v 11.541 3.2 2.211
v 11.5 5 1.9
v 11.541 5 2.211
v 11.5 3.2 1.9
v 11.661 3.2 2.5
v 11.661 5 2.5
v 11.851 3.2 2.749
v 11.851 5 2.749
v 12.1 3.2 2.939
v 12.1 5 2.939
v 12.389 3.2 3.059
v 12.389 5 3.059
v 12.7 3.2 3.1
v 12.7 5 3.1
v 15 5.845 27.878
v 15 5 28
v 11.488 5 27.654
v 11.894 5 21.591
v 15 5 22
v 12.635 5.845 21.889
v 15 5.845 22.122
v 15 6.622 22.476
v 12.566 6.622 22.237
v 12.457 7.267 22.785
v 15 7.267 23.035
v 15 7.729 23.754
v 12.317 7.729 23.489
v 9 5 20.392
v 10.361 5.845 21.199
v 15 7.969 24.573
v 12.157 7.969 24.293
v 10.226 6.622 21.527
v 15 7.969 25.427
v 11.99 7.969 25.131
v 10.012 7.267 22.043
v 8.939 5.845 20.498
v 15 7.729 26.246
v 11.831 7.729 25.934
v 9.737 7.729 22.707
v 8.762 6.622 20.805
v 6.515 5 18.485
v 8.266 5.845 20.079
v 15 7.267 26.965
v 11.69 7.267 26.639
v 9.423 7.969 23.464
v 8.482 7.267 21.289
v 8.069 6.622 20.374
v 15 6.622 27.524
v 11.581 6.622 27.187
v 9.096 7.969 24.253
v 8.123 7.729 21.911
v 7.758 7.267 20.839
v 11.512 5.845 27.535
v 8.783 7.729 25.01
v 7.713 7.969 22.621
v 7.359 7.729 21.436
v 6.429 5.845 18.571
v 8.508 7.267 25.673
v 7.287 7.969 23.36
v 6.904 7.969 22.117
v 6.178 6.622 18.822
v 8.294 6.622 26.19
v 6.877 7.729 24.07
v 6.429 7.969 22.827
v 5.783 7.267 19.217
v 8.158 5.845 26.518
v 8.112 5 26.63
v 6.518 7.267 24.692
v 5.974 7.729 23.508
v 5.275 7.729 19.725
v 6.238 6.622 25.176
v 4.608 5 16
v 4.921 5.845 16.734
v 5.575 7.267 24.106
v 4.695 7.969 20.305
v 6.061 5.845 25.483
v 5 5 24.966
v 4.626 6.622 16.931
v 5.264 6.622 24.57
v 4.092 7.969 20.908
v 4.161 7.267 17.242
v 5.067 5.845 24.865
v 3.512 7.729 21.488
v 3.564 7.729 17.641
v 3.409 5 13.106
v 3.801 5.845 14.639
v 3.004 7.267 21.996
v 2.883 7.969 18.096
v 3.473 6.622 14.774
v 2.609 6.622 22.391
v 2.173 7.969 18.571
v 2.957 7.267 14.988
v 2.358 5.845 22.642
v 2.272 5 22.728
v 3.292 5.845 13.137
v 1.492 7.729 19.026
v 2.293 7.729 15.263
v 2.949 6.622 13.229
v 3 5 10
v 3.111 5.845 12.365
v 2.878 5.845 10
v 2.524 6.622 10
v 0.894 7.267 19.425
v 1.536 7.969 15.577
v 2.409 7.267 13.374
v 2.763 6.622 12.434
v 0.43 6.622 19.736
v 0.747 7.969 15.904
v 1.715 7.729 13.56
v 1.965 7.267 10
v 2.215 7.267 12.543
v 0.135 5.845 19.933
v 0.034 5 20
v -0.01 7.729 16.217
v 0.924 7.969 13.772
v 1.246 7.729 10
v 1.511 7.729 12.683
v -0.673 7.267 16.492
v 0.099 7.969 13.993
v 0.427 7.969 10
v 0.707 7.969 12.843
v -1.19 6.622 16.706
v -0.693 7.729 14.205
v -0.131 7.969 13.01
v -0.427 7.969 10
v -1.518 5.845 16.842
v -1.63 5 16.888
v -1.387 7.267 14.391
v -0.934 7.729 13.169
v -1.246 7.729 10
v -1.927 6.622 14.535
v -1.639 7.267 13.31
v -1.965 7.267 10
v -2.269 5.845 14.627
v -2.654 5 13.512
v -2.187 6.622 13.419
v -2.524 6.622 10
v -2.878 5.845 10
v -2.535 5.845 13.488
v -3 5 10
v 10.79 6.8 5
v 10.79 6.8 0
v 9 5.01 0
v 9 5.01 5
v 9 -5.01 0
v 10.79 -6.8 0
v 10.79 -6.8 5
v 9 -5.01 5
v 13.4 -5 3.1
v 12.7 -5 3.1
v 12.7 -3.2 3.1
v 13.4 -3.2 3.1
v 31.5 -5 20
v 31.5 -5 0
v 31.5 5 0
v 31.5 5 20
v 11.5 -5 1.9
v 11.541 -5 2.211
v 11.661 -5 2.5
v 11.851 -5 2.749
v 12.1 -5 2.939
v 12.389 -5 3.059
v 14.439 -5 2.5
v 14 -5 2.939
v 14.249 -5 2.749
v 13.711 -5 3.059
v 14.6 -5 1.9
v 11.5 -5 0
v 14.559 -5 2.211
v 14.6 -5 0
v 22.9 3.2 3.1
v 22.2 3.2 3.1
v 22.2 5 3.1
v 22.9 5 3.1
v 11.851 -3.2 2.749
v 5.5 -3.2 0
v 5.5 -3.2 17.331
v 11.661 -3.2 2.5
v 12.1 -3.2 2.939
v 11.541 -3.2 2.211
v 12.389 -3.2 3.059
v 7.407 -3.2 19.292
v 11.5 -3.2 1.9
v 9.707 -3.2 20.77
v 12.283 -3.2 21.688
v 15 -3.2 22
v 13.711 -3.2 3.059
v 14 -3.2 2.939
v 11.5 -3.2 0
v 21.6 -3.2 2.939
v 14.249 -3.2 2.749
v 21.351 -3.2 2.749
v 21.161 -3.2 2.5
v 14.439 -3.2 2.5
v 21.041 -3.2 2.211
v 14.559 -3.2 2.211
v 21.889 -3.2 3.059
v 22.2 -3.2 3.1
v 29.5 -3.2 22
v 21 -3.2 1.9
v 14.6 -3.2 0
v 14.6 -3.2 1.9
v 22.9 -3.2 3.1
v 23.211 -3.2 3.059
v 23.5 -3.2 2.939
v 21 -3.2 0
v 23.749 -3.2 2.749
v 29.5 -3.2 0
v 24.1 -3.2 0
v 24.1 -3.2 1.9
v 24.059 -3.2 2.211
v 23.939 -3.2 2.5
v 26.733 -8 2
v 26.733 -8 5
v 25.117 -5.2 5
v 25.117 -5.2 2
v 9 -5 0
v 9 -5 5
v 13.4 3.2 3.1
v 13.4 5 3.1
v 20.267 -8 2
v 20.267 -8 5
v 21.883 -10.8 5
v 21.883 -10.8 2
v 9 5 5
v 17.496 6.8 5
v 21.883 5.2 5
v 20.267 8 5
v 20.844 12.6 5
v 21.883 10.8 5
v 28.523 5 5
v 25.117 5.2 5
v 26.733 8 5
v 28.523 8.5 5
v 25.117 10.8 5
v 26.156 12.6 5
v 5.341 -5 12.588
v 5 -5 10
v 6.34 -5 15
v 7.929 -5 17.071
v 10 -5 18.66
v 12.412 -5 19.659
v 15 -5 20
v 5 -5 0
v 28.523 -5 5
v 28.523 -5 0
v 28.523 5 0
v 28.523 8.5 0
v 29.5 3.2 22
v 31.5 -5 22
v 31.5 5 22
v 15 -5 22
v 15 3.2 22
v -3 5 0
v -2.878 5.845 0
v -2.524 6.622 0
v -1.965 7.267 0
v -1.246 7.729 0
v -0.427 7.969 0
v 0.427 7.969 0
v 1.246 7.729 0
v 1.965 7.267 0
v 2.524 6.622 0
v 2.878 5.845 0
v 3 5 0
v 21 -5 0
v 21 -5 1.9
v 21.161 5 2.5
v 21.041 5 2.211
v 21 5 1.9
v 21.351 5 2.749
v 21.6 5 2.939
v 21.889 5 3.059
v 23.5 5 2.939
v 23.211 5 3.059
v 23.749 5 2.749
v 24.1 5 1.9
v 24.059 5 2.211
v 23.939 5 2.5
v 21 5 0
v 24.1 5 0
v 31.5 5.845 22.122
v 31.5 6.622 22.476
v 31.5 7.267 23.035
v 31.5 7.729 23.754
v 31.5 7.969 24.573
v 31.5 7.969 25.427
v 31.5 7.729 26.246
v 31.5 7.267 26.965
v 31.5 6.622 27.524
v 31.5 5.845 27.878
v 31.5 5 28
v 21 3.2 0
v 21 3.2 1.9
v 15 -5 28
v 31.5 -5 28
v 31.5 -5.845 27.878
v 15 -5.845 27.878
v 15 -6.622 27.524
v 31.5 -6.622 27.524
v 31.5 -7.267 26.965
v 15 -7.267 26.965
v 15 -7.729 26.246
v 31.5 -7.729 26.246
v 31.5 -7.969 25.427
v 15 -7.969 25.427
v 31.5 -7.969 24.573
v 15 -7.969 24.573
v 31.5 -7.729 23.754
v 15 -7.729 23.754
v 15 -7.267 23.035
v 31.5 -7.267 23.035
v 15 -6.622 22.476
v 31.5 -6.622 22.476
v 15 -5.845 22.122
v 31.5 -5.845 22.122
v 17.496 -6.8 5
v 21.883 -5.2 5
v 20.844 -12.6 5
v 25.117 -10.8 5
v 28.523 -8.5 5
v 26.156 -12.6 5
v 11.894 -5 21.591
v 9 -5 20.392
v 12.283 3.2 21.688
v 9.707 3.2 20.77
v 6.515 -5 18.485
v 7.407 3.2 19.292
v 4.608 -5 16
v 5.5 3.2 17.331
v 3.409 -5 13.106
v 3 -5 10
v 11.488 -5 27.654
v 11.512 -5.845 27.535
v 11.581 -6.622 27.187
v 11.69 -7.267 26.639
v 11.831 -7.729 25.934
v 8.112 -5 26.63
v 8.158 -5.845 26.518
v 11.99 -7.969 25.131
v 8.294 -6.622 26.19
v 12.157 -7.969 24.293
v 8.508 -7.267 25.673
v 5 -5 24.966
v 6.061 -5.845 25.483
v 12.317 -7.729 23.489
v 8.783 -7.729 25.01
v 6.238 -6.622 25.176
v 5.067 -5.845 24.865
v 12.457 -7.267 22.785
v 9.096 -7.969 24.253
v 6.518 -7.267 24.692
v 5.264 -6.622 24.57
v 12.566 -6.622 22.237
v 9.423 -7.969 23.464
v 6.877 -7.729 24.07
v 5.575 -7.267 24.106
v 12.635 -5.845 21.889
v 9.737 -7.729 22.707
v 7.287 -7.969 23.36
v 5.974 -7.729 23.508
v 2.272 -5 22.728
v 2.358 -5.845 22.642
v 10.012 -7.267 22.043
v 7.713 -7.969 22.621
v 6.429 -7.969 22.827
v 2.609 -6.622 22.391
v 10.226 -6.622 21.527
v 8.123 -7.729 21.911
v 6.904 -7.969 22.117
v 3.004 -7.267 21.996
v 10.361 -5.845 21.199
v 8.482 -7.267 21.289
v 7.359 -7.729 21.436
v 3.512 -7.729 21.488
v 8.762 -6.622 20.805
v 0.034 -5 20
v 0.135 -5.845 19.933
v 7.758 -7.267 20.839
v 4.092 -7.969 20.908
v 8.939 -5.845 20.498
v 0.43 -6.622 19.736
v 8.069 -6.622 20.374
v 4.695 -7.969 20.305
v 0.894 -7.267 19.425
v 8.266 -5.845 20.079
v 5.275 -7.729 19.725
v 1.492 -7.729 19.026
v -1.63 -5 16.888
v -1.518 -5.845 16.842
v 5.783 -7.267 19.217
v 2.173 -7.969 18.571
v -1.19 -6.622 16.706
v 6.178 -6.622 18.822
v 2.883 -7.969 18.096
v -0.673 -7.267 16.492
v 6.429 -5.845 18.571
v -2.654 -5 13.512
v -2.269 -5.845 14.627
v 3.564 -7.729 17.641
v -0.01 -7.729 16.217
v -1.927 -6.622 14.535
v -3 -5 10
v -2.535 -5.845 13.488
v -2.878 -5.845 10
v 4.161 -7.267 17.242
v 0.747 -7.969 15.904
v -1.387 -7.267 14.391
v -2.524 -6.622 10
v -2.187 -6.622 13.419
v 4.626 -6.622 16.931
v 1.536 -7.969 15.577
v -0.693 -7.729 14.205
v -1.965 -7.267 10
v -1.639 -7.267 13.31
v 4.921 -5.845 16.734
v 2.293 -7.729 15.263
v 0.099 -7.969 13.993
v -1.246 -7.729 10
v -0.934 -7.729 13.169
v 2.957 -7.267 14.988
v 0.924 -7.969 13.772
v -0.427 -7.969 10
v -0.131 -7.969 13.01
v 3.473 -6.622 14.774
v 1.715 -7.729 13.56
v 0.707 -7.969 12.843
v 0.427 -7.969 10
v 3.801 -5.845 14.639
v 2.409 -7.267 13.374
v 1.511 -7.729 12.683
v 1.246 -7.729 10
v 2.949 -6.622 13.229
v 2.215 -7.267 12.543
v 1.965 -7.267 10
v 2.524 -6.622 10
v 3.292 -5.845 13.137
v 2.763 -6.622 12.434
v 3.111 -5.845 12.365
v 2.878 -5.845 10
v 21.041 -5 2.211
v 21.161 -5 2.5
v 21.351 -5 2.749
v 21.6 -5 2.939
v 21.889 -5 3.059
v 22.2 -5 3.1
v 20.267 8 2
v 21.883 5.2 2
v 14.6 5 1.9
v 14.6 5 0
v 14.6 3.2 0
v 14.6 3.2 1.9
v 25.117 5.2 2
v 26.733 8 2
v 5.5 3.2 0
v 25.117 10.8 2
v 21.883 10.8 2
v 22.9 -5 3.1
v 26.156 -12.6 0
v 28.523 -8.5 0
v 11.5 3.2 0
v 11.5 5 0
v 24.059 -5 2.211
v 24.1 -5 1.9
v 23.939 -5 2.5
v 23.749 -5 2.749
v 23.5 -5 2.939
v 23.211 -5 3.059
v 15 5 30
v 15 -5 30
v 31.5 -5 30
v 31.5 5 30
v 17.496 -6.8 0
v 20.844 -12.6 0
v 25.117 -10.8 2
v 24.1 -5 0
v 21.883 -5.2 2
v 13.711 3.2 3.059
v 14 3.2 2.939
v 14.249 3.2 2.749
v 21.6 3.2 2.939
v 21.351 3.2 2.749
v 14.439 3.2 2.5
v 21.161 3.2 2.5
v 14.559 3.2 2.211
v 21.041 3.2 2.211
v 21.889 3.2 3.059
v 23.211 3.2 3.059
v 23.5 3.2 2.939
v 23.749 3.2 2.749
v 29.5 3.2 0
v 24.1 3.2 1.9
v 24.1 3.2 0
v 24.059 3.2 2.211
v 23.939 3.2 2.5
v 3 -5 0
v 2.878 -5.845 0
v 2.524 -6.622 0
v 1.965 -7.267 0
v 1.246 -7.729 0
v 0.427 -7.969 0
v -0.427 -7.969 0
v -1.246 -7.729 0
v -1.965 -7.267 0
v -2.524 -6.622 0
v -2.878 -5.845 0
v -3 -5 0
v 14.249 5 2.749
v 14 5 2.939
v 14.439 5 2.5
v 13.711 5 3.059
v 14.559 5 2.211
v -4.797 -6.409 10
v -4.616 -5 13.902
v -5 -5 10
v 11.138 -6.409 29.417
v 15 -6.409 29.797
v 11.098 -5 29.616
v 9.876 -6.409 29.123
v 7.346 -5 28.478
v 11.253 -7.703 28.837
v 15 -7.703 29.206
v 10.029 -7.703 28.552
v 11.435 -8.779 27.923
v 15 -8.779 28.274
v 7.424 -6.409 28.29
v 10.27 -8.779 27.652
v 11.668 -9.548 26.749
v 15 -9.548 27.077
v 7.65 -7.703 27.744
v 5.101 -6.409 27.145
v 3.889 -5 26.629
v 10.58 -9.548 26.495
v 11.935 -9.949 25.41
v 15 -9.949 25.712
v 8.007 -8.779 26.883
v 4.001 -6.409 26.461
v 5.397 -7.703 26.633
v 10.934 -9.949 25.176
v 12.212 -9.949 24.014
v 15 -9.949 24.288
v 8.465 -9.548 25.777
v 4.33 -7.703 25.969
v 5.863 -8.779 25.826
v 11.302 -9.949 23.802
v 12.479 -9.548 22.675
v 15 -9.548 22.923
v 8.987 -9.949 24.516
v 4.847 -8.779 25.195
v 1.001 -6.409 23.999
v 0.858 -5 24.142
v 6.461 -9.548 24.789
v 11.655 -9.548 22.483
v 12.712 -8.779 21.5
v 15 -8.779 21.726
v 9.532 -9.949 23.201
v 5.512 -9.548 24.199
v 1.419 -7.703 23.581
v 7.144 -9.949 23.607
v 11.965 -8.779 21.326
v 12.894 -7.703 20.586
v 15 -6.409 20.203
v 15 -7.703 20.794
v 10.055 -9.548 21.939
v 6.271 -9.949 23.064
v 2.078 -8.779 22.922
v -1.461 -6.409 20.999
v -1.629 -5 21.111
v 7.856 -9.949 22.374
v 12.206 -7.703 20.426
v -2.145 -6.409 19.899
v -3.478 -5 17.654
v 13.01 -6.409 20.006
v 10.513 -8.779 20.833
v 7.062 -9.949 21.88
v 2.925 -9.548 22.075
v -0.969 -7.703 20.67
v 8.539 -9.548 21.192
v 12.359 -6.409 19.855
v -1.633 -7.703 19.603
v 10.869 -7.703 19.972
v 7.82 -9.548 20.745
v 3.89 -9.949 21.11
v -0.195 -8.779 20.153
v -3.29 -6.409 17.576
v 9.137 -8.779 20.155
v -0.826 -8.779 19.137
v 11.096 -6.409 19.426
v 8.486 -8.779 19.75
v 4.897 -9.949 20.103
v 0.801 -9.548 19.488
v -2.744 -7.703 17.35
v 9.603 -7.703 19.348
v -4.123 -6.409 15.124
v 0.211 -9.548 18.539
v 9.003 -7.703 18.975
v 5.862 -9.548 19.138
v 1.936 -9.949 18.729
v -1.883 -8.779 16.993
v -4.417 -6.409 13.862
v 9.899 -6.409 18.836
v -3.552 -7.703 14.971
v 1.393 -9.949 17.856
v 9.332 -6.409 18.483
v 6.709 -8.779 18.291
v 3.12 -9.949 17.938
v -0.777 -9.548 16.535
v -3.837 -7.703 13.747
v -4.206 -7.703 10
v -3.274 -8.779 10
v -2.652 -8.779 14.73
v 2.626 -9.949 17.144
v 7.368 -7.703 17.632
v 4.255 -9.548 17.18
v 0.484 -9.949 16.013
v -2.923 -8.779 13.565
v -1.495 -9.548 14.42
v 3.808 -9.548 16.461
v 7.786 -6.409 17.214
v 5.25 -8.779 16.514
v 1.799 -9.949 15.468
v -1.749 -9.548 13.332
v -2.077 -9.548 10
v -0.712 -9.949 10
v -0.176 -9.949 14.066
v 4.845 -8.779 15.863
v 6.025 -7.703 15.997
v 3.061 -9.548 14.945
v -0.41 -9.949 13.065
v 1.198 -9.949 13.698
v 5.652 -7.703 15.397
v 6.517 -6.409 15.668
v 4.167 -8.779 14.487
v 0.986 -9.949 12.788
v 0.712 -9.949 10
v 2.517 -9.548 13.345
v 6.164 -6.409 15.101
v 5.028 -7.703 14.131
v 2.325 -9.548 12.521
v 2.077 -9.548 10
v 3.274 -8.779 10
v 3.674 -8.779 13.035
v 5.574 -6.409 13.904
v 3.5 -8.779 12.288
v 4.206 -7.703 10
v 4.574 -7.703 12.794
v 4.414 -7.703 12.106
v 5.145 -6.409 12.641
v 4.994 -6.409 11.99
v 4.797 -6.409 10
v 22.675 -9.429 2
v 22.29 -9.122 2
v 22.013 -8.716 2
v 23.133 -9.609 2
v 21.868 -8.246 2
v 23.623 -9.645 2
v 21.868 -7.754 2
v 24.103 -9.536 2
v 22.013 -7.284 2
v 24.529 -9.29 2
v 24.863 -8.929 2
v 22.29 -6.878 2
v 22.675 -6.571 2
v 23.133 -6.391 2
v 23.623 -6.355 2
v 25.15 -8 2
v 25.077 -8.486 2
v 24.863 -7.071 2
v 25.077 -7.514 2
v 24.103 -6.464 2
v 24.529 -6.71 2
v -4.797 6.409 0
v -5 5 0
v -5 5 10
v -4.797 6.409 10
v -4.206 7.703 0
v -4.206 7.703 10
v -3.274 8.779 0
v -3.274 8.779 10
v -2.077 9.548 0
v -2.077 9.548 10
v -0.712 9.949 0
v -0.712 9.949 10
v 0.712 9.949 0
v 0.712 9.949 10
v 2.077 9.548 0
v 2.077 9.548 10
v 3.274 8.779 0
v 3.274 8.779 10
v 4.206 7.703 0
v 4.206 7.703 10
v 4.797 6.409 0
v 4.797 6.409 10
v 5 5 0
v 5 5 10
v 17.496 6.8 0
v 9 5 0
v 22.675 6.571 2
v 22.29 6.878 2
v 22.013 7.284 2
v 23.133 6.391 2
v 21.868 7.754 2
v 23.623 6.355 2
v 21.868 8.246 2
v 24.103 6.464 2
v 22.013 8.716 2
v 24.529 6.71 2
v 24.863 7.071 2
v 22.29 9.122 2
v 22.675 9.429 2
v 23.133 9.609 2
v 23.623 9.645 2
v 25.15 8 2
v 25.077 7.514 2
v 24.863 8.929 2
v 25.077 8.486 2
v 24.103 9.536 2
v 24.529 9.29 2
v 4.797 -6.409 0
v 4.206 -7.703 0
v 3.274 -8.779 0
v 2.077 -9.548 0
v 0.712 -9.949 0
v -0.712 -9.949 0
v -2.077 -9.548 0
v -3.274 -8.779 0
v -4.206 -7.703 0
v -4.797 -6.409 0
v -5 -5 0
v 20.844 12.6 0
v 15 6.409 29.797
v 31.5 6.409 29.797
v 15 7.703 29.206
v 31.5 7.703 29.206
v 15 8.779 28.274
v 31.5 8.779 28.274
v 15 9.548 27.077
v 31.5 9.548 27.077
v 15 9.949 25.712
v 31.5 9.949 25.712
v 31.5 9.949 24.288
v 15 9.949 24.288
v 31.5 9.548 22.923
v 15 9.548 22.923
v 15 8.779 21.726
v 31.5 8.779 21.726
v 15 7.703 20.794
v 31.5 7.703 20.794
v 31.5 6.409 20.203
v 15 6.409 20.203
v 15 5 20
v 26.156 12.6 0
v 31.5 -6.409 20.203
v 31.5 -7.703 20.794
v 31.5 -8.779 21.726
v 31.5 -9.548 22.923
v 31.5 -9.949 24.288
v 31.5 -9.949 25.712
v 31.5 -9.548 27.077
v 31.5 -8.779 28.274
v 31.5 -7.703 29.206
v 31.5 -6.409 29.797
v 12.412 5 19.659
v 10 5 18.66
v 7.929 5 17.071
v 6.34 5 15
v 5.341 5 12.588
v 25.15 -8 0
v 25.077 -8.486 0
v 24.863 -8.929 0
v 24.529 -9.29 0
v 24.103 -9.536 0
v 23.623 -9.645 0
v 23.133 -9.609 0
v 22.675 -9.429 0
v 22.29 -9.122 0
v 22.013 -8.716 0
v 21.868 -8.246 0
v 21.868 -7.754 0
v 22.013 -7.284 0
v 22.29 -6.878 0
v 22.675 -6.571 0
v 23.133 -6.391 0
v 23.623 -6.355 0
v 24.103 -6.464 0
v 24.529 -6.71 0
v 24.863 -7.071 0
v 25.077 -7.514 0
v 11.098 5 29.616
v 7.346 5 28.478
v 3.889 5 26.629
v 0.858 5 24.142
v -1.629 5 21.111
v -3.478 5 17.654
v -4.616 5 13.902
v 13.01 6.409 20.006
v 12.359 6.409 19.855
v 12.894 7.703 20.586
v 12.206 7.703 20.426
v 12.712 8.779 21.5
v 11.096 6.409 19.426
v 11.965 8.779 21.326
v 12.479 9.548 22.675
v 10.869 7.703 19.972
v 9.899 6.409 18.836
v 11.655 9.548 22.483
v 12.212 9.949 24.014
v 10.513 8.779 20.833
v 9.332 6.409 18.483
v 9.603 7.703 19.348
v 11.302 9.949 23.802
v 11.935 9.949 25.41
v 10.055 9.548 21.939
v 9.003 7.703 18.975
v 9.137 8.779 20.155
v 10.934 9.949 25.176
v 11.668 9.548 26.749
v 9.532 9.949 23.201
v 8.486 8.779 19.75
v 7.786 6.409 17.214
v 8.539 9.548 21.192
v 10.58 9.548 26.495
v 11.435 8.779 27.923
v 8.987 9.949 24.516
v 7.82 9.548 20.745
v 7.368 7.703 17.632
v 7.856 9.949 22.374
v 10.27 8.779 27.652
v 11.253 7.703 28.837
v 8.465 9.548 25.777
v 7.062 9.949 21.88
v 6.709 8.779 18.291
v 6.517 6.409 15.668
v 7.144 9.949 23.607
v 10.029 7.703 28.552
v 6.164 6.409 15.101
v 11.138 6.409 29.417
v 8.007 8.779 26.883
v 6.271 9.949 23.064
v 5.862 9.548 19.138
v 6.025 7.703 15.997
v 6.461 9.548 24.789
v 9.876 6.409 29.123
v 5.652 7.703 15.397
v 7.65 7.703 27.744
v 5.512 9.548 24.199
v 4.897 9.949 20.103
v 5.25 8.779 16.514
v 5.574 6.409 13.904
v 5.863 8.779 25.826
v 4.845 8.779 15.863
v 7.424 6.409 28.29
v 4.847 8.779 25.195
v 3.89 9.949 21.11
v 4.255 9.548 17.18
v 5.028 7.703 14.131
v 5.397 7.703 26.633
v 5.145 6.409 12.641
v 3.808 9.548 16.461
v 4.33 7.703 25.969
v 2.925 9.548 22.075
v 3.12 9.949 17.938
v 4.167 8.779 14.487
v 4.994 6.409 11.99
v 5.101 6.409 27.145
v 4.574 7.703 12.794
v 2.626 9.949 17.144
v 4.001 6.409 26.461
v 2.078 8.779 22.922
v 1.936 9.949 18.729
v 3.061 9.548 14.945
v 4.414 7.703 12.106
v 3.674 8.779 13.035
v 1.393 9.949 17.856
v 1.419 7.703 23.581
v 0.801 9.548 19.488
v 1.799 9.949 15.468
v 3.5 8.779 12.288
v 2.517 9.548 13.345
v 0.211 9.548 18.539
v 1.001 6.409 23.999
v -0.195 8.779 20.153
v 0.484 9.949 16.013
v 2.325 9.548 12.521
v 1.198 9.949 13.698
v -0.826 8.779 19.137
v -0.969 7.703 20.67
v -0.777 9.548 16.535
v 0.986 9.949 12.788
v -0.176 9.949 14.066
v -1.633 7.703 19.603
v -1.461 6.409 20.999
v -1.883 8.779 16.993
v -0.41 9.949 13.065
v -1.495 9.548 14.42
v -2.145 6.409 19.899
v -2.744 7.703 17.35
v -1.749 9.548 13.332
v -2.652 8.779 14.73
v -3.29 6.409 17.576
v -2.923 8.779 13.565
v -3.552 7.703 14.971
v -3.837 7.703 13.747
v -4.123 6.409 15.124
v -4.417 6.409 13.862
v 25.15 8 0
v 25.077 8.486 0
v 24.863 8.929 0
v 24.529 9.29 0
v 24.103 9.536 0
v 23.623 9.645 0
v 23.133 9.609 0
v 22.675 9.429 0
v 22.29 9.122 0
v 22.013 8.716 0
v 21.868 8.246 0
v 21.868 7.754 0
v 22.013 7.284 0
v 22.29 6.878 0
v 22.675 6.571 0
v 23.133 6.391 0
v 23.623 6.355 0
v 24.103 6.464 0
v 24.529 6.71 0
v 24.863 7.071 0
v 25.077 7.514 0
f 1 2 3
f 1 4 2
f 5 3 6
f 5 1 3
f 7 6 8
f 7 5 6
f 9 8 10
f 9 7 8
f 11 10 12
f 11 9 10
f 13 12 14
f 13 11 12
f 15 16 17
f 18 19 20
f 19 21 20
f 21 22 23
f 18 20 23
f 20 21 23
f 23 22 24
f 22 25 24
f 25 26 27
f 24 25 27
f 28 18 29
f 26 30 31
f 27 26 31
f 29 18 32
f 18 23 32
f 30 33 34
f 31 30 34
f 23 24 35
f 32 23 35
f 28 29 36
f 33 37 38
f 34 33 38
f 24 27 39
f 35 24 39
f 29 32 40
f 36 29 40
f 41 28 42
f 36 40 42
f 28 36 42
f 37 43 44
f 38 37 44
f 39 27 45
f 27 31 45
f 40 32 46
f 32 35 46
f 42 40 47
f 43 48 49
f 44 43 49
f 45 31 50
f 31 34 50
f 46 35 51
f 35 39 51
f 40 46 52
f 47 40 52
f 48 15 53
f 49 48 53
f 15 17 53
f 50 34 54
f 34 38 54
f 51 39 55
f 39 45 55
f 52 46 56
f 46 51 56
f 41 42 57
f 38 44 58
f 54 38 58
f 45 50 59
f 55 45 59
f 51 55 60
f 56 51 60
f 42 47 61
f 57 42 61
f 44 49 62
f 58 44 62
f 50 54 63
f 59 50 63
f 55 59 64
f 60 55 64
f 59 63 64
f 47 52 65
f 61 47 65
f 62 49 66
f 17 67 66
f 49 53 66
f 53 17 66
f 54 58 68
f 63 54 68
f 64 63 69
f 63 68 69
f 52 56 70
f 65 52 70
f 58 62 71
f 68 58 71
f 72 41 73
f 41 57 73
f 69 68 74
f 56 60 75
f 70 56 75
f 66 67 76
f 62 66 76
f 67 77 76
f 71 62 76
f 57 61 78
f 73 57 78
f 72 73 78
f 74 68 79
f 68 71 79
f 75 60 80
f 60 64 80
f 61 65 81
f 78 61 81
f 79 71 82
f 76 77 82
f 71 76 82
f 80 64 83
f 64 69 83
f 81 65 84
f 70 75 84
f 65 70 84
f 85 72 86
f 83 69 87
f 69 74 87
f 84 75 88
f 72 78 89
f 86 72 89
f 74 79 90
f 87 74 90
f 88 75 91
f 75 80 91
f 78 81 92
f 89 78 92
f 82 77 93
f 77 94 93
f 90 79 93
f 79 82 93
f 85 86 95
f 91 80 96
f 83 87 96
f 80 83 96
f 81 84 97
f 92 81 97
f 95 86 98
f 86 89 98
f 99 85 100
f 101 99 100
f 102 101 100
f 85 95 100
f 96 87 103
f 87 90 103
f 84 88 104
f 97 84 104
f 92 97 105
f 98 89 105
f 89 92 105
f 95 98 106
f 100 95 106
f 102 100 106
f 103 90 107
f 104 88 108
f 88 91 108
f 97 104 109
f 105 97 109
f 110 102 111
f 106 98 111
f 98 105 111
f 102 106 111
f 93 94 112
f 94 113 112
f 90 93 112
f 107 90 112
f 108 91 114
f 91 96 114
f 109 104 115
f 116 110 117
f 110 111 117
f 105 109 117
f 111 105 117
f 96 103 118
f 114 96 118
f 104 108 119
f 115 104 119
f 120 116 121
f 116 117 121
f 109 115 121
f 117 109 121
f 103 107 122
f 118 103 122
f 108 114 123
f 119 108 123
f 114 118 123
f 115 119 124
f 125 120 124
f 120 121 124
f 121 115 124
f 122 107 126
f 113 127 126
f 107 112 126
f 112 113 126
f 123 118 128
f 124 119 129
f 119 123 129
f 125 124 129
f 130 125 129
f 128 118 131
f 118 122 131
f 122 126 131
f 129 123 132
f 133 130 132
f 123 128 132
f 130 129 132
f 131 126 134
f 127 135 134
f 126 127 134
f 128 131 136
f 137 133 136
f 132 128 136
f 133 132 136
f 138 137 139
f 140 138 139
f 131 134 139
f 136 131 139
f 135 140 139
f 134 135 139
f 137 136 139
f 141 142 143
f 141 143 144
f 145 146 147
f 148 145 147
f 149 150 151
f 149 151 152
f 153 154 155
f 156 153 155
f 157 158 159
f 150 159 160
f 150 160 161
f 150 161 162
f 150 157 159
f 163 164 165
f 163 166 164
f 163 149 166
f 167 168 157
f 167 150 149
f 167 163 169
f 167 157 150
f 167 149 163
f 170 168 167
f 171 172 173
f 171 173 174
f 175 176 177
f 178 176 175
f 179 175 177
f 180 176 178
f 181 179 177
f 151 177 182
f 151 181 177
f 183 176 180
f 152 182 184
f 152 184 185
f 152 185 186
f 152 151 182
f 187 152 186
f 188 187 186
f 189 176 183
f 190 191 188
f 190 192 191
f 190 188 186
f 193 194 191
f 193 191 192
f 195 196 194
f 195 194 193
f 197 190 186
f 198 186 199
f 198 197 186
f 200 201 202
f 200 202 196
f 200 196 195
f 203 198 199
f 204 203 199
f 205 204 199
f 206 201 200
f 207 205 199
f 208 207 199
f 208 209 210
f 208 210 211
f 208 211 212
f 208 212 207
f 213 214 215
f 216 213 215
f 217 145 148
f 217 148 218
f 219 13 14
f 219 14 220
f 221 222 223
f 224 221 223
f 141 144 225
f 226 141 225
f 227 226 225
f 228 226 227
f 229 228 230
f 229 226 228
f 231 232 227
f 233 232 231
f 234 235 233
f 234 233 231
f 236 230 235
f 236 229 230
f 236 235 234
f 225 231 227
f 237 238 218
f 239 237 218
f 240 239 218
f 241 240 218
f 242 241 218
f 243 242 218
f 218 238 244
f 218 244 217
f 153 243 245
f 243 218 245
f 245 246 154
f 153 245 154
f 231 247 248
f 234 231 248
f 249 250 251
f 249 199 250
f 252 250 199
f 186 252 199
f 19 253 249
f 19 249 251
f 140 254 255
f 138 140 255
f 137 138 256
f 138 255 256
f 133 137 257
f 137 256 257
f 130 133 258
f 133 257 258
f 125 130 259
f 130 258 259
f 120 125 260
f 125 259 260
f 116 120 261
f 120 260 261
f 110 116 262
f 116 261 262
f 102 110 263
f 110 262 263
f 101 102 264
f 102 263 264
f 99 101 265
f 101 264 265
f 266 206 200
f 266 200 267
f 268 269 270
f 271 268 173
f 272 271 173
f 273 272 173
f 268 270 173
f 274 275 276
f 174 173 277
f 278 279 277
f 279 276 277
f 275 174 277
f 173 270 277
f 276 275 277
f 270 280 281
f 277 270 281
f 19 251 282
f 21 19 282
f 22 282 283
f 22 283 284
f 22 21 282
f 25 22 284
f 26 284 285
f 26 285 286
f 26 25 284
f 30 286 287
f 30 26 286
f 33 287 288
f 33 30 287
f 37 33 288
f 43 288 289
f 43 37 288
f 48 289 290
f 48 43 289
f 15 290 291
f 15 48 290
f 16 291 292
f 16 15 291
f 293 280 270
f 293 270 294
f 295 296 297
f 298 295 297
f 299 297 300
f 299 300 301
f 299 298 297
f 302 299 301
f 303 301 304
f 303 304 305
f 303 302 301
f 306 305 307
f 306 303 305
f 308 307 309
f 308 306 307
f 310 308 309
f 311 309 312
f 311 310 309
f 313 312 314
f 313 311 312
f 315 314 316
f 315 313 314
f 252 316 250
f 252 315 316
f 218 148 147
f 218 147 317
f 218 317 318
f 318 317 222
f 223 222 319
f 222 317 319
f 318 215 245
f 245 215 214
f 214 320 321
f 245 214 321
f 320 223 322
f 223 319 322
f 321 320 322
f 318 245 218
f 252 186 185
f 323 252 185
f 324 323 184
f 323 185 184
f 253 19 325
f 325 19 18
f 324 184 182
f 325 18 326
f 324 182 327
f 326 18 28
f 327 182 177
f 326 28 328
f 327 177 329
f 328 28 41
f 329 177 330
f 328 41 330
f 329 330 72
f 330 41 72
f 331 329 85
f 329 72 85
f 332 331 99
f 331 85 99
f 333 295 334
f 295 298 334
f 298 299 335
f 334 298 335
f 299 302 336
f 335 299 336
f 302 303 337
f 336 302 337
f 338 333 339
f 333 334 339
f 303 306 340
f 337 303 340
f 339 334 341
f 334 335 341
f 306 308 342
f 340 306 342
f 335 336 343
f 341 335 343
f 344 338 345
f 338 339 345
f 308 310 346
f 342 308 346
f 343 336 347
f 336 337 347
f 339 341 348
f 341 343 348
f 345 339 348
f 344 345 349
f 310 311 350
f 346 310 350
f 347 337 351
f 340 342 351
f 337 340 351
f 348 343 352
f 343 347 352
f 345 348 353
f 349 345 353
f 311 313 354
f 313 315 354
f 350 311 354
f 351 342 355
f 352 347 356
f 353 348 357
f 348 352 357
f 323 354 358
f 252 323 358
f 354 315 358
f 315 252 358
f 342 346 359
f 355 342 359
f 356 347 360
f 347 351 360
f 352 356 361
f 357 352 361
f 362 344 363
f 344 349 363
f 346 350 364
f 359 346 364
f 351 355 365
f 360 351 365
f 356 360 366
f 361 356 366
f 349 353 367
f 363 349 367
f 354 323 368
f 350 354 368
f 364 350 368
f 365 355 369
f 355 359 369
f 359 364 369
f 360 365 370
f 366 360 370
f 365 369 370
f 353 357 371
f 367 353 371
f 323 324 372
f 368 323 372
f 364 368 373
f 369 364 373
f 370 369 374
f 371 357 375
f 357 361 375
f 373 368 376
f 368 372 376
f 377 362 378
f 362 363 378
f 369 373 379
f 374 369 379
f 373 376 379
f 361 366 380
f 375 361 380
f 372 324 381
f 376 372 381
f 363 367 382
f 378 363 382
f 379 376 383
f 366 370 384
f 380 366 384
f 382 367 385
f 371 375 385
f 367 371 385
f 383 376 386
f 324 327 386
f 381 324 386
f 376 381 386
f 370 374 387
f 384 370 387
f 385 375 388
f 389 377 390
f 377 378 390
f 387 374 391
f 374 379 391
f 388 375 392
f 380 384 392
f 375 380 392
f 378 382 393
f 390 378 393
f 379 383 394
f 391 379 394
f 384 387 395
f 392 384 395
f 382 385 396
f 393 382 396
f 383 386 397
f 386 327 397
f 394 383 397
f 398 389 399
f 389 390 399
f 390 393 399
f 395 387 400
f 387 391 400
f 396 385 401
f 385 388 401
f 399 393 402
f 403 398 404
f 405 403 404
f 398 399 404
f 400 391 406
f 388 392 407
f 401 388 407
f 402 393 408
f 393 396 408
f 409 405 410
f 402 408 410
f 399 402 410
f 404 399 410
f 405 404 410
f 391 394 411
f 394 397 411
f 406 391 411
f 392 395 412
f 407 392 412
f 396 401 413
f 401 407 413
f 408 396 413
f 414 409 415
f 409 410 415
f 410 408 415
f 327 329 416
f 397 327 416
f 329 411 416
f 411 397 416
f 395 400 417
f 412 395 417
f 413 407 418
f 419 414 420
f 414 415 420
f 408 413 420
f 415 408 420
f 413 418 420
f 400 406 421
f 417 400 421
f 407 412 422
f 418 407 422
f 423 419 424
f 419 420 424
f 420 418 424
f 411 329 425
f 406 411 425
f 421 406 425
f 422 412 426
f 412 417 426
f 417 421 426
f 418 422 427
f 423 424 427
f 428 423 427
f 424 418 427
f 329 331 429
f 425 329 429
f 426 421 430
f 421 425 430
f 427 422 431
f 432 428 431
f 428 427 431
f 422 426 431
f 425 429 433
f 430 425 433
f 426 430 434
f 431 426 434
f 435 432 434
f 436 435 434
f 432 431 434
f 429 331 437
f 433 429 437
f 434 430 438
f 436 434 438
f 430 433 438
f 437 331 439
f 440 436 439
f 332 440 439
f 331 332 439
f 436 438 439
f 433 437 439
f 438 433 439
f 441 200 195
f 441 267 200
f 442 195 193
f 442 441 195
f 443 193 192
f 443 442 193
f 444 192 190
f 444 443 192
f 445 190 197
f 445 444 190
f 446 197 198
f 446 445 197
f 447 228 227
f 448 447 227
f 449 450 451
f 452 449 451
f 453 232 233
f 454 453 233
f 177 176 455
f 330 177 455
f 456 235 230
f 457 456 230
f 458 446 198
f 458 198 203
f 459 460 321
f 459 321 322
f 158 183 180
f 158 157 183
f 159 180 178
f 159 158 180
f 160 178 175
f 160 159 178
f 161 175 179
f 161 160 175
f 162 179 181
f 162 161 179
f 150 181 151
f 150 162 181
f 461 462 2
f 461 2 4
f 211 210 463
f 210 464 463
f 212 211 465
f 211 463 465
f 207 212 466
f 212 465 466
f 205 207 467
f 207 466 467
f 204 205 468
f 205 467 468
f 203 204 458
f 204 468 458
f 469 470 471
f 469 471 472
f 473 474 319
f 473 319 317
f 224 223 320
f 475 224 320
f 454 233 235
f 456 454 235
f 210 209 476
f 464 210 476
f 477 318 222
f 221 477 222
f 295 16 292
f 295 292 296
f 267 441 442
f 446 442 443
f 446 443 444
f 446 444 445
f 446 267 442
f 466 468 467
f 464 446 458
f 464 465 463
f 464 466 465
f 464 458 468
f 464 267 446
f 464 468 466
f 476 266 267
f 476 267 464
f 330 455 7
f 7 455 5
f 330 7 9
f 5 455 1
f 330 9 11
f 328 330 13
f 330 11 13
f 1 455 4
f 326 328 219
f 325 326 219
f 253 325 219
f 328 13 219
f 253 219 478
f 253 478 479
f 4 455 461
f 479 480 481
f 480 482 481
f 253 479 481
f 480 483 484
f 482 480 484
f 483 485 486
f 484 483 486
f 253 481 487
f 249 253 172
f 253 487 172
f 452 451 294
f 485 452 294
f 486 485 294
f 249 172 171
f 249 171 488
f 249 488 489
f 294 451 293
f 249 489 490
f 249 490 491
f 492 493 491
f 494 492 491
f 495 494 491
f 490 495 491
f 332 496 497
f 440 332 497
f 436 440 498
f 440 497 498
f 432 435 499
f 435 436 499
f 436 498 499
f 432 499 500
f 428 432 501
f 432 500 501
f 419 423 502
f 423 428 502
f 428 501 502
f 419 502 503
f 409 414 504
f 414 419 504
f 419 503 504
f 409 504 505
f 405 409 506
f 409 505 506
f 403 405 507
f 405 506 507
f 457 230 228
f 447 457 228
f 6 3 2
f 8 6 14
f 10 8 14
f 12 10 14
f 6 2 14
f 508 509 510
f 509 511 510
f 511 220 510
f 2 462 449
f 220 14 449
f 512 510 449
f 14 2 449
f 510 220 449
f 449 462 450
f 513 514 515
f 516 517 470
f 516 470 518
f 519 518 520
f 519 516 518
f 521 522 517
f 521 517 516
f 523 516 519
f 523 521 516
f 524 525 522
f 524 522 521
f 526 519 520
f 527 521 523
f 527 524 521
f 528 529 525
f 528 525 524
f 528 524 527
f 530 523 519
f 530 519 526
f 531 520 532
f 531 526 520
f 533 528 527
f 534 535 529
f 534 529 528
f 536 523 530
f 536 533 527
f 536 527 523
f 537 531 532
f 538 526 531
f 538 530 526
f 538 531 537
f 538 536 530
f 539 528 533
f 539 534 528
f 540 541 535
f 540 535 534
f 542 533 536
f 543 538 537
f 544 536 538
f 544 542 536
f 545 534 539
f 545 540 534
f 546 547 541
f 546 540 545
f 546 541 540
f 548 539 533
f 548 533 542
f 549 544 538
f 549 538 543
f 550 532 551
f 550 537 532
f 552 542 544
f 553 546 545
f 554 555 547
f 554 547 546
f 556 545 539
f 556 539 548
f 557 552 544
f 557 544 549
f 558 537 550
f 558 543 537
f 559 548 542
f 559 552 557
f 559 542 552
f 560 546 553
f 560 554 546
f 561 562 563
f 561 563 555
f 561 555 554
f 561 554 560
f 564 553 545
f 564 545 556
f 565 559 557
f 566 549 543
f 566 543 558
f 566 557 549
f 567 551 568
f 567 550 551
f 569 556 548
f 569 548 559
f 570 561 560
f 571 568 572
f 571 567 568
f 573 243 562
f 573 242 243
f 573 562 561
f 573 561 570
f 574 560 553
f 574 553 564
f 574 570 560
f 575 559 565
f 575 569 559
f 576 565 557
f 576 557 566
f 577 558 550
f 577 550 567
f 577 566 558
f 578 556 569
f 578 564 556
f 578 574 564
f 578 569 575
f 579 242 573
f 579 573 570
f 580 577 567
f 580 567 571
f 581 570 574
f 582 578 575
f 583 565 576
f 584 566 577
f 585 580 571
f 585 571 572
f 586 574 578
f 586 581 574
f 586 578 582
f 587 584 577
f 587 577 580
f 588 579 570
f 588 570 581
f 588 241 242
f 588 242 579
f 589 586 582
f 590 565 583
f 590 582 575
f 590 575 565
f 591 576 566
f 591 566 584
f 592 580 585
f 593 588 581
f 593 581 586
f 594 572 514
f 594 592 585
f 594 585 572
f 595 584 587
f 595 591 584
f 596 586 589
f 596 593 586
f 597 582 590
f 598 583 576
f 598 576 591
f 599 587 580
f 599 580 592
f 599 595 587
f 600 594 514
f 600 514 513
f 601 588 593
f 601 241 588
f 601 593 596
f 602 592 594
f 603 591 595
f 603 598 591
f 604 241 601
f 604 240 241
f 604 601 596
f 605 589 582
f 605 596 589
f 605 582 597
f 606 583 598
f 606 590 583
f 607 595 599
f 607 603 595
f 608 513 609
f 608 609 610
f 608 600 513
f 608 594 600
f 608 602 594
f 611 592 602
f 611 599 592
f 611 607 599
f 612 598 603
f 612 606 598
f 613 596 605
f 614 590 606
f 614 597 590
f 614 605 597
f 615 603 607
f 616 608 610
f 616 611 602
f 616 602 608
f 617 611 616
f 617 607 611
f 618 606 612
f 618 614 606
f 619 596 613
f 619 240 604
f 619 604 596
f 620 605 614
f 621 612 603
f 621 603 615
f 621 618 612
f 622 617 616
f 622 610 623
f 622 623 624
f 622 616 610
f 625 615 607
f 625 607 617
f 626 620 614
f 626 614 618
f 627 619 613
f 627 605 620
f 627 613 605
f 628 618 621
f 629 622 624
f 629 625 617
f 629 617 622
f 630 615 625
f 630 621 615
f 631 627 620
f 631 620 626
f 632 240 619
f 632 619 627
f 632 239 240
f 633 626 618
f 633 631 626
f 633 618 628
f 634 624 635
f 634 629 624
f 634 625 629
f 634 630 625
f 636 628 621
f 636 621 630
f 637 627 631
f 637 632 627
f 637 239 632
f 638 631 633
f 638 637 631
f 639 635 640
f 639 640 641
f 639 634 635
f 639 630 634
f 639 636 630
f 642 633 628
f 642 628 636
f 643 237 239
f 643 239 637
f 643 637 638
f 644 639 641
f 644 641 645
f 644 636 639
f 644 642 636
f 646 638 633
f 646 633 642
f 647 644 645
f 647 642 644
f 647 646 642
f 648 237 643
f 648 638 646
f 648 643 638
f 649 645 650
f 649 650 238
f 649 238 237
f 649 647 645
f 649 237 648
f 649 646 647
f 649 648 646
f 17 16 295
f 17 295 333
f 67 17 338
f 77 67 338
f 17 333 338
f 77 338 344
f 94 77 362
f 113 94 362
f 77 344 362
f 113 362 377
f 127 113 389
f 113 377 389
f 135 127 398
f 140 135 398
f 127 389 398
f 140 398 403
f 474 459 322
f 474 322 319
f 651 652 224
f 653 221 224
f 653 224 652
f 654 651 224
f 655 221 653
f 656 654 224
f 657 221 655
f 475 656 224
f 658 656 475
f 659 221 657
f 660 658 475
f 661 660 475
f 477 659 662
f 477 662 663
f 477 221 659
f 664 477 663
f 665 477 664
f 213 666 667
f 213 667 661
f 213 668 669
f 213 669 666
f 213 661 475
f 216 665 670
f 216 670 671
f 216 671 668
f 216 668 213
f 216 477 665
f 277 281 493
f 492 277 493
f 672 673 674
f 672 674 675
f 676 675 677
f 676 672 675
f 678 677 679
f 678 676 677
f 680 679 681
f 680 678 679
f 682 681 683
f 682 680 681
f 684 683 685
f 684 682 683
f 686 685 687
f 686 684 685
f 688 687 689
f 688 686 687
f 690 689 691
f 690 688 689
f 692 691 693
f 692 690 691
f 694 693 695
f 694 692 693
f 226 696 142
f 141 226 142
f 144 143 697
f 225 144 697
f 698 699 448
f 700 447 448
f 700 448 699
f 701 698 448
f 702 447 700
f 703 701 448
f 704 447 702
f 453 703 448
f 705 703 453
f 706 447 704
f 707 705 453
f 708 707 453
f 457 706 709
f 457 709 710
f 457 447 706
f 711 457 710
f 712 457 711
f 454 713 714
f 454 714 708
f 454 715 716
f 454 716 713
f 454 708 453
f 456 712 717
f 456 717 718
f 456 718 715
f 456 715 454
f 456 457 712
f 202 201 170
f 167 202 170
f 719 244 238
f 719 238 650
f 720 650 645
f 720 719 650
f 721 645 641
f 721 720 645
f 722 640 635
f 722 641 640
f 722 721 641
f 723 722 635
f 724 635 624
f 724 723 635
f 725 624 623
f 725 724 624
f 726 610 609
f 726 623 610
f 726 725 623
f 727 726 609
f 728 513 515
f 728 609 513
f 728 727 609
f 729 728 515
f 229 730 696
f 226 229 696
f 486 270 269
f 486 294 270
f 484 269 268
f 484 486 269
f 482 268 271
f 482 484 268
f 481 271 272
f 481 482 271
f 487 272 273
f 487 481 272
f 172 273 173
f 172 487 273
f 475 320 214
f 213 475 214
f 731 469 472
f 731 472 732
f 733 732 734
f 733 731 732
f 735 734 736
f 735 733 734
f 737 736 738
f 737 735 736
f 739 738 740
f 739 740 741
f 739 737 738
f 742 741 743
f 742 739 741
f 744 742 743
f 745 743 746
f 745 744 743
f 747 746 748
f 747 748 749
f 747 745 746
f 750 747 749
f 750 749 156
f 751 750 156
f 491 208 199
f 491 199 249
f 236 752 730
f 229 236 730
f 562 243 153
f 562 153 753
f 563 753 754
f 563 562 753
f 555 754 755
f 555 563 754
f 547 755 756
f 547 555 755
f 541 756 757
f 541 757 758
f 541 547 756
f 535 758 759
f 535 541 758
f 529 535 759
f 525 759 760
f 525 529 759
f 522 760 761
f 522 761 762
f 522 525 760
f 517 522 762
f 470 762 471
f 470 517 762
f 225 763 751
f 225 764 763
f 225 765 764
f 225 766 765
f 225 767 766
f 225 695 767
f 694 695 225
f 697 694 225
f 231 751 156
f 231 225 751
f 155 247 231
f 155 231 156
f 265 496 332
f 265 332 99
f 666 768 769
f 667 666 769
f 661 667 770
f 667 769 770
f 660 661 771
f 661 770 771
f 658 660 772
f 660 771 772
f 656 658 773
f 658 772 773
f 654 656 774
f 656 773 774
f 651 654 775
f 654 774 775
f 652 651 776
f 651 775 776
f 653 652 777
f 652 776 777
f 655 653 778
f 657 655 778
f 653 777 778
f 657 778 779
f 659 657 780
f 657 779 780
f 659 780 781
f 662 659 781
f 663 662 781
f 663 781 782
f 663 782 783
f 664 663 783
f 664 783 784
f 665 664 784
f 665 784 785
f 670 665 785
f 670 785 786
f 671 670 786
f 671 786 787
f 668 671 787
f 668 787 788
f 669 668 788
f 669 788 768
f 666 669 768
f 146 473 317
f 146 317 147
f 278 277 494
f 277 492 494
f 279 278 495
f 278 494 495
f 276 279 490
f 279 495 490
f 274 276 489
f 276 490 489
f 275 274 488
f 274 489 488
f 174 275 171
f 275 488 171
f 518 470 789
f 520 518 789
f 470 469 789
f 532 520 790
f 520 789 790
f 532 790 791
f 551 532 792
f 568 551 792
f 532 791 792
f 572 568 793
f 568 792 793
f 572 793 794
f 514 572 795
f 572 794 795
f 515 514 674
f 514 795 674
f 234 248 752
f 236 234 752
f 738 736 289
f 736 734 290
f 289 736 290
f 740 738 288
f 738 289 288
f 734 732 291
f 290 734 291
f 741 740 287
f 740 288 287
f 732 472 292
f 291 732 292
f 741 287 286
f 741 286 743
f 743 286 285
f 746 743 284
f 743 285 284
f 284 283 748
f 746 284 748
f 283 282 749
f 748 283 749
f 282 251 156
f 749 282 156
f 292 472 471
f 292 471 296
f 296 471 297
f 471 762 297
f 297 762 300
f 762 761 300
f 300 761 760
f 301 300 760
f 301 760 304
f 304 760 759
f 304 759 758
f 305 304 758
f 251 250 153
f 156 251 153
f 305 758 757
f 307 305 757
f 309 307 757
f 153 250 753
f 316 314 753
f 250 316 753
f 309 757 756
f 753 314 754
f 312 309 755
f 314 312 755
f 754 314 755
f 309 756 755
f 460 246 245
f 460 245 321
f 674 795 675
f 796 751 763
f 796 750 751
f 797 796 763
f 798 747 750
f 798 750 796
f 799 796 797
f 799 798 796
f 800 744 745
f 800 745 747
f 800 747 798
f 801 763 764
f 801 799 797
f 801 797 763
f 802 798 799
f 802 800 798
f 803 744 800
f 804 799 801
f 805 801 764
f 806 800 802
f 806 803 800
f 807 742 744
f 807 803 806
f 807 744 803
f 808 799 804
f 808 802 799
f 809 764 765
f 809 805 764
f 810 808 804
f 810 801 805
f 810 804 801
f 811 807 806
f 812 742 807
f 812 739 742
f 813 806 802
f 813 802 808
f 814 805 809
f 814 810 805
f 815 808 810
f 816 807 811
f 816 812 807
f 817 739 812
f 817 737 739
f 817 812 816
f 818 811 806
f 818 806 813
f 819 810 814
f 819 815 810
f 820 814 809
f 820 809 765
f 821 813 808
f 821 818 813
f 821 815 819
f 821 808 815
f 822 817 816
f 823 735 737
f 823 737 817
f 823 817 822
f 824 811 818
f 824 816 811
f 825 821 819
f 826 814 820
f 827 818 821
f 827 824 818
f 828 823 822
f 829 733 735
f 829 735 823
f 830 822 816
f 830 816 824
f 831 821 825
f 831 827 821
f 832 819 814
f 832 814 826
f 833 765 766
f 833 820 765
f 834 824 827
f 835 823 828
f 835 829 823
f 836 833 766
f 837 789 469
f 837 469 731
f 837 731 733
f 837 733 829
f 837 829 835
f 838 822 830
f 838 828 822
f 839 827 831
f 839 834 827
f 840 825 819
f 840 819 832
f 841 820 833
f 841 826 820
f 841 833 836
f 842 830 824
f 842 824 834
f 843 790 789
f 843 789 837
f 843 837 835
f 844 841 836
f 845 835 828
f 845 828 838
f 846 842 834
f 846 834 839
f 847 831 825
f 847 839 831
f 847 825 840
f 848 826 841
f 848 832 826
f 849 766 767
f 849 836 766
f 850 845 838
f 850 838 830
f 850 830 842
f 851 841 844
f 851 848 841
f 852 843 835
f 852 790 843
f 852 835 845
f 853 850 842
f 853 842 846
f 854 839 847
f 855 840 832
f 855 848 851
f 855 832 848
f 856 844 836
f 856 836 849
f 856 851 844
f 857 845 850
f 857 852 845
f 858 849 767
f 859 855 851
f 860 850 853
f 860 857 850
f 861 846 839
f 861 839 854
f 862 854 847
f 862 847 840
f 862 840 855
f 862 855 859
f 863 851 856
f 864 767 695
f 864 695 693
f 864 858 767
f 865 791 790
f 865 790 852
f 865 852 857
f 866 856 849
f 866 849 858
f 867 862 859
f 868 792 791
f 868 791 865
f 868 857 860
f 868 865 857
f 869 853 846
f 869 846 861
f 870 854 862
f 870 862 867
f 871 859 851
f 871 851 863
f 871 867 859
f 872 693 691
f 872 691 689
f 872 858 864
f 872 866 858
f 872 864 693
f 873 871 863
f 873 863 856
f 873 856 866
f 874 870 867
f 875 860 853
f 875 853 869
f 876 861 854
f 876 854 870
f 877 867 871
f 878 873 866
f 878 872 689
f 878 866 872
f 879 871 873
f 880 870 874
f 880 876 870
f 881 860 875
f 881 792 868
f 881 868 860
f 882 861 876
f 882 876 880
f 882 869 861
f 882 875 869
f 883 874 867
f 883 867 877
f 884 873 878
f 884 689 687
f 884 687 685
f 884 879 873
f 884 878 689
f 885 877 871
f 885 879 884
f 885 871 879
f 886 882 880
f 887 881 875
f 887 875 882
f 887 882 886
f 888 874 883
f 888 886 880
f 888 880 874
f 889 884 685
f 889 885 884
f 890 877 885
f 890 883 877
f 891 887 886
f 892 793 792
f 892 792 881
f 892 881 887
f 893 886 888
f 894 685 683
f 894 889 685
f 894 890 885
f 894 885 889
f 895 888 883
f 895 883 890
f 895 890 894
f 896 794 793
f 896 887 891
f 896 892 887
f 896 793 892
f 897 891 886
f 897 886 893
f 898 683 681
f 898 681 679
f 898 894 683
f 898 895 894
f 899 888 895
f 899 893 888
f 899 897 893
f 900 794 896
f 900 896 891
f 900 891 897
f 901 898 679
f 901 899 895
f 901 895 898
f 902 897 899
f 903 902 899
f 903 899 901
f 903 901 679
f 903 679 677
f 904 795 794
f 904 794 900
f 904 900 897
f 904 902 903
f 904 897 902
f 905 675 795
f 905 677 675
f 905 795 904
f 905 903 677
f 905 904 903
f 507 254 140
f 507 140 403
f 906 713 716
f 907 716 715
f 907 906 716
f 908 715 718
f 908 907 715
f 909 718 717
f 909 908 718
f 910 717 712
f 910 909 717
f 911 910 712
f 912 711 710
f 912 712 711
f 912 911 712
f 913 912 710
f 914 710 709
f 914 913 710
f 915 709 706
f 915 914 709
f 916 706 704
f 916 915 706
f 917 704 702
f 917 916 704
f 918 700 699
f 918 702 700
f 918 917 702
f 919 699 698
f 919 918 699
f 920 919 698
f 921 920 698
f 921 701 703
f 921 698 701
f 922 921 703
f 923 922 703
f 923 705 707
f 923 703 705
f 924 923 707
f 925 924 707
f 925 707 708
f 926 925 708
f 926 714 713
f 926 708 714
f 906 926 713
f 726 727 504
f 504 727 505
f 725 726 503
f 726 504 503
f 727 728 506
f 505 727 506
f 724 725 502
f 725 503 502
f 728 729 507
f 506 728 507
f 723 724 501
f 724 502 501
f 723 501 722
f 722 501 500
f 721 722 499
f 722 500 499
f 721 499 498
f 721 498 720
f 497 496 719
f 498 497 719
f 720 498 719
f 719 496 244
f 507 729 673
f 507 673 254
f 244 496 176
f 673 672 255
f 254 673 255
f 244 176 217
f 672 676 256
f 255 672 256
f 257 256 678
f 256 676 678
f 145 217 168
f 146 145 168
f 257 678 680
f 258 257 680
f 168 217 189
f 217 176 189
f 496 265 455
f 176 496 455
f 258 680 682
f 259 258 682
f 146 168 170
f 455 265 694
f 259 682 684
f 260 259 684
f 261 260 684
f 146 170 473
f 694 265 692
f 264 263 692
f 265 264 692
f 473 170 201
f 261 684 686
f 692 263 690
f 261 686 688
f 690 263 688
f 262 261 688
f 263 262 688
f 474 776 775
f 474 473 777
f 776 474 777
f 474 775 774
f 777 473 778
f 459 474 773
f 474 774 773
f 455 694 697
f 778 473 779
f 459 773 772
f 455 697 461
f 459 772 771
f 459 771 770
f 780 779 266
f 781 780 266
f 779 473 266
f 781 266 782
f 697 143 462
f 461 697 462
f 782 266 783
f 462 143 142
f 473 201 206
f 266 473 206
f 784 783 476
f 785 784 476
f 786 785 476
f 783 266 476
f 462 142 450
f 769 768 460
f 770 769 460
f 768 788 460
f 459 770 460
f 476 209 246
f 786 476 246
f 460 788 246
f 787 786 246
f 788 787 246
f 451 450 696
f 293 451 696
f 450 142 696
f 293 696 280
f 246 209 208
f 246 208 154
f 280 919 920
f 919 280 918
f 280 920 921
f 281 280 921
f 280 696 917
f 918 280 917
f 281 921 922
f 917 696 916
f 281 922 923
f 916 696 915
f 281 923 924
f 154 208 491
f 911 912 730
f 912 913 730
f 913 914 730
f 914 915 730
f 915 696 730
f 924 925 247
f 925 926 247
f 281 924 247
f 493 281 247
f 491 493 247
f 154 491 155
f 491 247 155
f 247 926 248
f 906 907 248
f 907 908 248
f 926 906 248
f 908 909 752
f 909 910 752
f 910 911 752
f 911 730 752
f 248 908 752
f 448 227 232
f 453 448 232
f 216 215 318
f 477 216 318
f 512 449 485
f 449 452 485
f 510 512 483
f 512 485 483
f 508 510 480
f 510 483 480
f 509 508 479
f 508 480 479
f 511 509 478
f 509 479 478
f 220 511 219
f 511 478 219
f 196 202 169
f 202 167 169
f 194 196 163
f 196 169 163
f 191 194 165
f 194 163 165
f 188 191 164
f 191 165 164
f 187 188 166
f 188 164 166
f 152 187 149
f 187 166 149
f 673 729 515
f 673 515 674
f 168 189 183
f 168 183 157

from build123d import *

# Parameters (mm, degrees)
SKETCH_W          = 26.5
SKETCH_H          = 10
SKETCH_W_2        = 24
SKETCH_H_2        = 6.4
PAD_DEPTH         = 20
POCKET_DEPTH      = 5.001
POCKET_DEPTH_BACK = 5.001
SKETCH004_R       = 1.65
PAD001_DEPTH      = 5
SKETCH005_W       = 3.1
SKETCH005_H       = 10
POCKET001_DEPTH   = 3.1
FILLET_R          = 1.2
SKETCH006_W       = 24
SKETCH006_H       = 6.4
POCKET002_DEPTH   = 22
POCKET003_DEPTH   = 3
CHAMFER_SIZE      = 1.79


with BuildPart() as part:
    # Sketch → Pad (new body)
    with BuildSketch(Plane.XY):
        with Locations((18.25, 0)):
            Rectangle(SKETCH_W, SKETCH_H)
        with Locations((17.5, 0)):
            Rectangle(SKETCH_W_2, SKETCH_H_2, mode=Mode.SUBTRACT)
    extrude(amount=PAD_DEPTH)

    # Sketch003 → Pocket (cut, two sides)
    with BuildSketch(Plane.XZ) as pocket_sk:
        with BuildLine():
            Line((5, 0), (5, 10))
            ThreePointArc((15, 20), (7.928932, 17.071068), (5, 10))
            Line((15, 20), (35.5, 20))
            Line((35.5, 20), (35.5, 25))
            Line((35.5, 25), (0, 25))
            Line((0, 25), (0, 0))
            Line((0, 0), (5, 0))
        make_face()
    extrude(amount=-POCKET_DEPTH, mode=Mode.SUBTRACT)
    extrude(pocket_sk.sketch, amount=POCKET_DEPTH_BACK, mode=Mode.SUBTRACT)

    # AdditivePipe: sweep along a path in Sketch002
    with BuildLine(Plane.XZ) as additivepipe_path:
        Line((31.5, 25), (15.000006, 25))
        ThreePointArc((15.000006, 25), (4.393402, 20.606602), (0, 10))
        Line((0, 10), (0, 0))
    # Sketch001 (on Face9 of Pad) → AdditivePipe (sweep)
    with BuildSketch(Plane(origin=(0, 0, 0), x_dir=(1, 0, 0), z_dir=(0, 0, -1))):
        with BuildLine():
            ThreePointArc((5, 5), (0, 10), (-5, 5))
            Line((-5, 5), (-5, -5))
            ThreePointArc((-5, -5), (0, -10), (5, -5))
            Line((5, 5), (5, -5))
        make_face()
        with BuildLine():
            ThreePointArc((3, 5), (0, 8), (-3, 5))
            Line((-3, 5), (-3, -5))
            ThreePointArc((-3, -5), (0, -8), (3, -5))
            Line((3, 5), (3, -5))
        make_face(mode=Mode.SUBTRACT)
    sweep(path=additivepipe_path.line)

    # Sketch004 (on Face2 of AdditivePipe) → Pad001 (join)
    with BuildSketch(Plane(origin=(0, 0, 0), x_dir=(1, 0, 0), z_dir=(0, 0, -1))):
        Polygon((28.522947, 8.5), (26.155811, 12.6), (20.844189, 12.6), (17.495557, 6.8), (9, 6.8), (9, 5), (28.522947, 5), align=None)
        with Locations((23.5, 8)):
            Circle(SKETCH004_R, mode=Mode.SUBTRACT)
    pad001 = extrude(amount=-PAD001_DEPTH)

    # Mirrored: Pad001 across XZ
    add(pad001.mirror(Plane.XZ))

    # Sketch005 (on Face2 of Mirrored) → Pocket001 (cut)
    with BuildSketch(Plane(origin=(0, 0, 0), x_dir=(1, 0, 0), z_dir=(0, 0, -1))):
        with Locations((13.05, 0)):
            Rectangle(SKETCH005_W, SKETCH005_H)
        with Locations((22.55, 0)):
            Rectangle(SKETCH005_W, SKETCH005_H)
    extrude(amount=-POCKET001_DEPTH, mode=Mode.SUBTRACT)

    # Fillet
    fillet_edges = [part.edges().sort_by_distance(p)[0] for p in [
        (11.5, 4.1, 3.1),
        (11.5, -4.1, 3.1),
        (21, -4.1, 3.1),
        (21, 4.1, 3.1),
        (14.6, 4.1, 3.1),
        (14.6, -4.1, 3.1),
        (24.1, -4.1, 3.1),
        (24.1, 4.1, 3.1),
    ]]
    fillet(fillet_edges, radius=FILLET_R)

    # Sketch006 (on Face51 of Fillet) → Pocket002 (cut)
    with BuildSketch(Plane(origin=(0, 0, 0), x_dir=(1, 0, 0), z_dir=(0, 0, -1))):
        with Locations((17.5, 0)):
            Rectangle(SKETCH006_W, SKETCH006_H)
    extrude(amount=-POCKET002_DEPTH, mode=Mode.SUBTRACT)

    # Sketch007 (on Face66 of Pocket002) → Pocket003 (cut)
    with BuildSketch(Plane.XY.offset(5)):
        Polygon((26.733162, -8), (25.116581, -5.2), (21.883419, -5.2), (20.266838, -8), (21.883419, -10.8), (25.116581, -10.8), align=None)
        Polygon((25.116581, 5.2), (26.733162, 8), (25.116581, 10.8), (21.883419, 10.8), (20.266838, 8), (21.883419, 5.2), align=None)
    extrude(amount=-POCKET003_DEPTH, mode=Mode.SUBTRACT)

    # Chamfer
    chamfer_edges = [part.edges().sort_by_distance(p)[0] for p in [
        (9, -6.8, 2.5),
        (9, 6.8, 2.5),
    ]]
    chamfer(chamfer_edges, length=CHAMFER_SIZE)


solid = part.part
